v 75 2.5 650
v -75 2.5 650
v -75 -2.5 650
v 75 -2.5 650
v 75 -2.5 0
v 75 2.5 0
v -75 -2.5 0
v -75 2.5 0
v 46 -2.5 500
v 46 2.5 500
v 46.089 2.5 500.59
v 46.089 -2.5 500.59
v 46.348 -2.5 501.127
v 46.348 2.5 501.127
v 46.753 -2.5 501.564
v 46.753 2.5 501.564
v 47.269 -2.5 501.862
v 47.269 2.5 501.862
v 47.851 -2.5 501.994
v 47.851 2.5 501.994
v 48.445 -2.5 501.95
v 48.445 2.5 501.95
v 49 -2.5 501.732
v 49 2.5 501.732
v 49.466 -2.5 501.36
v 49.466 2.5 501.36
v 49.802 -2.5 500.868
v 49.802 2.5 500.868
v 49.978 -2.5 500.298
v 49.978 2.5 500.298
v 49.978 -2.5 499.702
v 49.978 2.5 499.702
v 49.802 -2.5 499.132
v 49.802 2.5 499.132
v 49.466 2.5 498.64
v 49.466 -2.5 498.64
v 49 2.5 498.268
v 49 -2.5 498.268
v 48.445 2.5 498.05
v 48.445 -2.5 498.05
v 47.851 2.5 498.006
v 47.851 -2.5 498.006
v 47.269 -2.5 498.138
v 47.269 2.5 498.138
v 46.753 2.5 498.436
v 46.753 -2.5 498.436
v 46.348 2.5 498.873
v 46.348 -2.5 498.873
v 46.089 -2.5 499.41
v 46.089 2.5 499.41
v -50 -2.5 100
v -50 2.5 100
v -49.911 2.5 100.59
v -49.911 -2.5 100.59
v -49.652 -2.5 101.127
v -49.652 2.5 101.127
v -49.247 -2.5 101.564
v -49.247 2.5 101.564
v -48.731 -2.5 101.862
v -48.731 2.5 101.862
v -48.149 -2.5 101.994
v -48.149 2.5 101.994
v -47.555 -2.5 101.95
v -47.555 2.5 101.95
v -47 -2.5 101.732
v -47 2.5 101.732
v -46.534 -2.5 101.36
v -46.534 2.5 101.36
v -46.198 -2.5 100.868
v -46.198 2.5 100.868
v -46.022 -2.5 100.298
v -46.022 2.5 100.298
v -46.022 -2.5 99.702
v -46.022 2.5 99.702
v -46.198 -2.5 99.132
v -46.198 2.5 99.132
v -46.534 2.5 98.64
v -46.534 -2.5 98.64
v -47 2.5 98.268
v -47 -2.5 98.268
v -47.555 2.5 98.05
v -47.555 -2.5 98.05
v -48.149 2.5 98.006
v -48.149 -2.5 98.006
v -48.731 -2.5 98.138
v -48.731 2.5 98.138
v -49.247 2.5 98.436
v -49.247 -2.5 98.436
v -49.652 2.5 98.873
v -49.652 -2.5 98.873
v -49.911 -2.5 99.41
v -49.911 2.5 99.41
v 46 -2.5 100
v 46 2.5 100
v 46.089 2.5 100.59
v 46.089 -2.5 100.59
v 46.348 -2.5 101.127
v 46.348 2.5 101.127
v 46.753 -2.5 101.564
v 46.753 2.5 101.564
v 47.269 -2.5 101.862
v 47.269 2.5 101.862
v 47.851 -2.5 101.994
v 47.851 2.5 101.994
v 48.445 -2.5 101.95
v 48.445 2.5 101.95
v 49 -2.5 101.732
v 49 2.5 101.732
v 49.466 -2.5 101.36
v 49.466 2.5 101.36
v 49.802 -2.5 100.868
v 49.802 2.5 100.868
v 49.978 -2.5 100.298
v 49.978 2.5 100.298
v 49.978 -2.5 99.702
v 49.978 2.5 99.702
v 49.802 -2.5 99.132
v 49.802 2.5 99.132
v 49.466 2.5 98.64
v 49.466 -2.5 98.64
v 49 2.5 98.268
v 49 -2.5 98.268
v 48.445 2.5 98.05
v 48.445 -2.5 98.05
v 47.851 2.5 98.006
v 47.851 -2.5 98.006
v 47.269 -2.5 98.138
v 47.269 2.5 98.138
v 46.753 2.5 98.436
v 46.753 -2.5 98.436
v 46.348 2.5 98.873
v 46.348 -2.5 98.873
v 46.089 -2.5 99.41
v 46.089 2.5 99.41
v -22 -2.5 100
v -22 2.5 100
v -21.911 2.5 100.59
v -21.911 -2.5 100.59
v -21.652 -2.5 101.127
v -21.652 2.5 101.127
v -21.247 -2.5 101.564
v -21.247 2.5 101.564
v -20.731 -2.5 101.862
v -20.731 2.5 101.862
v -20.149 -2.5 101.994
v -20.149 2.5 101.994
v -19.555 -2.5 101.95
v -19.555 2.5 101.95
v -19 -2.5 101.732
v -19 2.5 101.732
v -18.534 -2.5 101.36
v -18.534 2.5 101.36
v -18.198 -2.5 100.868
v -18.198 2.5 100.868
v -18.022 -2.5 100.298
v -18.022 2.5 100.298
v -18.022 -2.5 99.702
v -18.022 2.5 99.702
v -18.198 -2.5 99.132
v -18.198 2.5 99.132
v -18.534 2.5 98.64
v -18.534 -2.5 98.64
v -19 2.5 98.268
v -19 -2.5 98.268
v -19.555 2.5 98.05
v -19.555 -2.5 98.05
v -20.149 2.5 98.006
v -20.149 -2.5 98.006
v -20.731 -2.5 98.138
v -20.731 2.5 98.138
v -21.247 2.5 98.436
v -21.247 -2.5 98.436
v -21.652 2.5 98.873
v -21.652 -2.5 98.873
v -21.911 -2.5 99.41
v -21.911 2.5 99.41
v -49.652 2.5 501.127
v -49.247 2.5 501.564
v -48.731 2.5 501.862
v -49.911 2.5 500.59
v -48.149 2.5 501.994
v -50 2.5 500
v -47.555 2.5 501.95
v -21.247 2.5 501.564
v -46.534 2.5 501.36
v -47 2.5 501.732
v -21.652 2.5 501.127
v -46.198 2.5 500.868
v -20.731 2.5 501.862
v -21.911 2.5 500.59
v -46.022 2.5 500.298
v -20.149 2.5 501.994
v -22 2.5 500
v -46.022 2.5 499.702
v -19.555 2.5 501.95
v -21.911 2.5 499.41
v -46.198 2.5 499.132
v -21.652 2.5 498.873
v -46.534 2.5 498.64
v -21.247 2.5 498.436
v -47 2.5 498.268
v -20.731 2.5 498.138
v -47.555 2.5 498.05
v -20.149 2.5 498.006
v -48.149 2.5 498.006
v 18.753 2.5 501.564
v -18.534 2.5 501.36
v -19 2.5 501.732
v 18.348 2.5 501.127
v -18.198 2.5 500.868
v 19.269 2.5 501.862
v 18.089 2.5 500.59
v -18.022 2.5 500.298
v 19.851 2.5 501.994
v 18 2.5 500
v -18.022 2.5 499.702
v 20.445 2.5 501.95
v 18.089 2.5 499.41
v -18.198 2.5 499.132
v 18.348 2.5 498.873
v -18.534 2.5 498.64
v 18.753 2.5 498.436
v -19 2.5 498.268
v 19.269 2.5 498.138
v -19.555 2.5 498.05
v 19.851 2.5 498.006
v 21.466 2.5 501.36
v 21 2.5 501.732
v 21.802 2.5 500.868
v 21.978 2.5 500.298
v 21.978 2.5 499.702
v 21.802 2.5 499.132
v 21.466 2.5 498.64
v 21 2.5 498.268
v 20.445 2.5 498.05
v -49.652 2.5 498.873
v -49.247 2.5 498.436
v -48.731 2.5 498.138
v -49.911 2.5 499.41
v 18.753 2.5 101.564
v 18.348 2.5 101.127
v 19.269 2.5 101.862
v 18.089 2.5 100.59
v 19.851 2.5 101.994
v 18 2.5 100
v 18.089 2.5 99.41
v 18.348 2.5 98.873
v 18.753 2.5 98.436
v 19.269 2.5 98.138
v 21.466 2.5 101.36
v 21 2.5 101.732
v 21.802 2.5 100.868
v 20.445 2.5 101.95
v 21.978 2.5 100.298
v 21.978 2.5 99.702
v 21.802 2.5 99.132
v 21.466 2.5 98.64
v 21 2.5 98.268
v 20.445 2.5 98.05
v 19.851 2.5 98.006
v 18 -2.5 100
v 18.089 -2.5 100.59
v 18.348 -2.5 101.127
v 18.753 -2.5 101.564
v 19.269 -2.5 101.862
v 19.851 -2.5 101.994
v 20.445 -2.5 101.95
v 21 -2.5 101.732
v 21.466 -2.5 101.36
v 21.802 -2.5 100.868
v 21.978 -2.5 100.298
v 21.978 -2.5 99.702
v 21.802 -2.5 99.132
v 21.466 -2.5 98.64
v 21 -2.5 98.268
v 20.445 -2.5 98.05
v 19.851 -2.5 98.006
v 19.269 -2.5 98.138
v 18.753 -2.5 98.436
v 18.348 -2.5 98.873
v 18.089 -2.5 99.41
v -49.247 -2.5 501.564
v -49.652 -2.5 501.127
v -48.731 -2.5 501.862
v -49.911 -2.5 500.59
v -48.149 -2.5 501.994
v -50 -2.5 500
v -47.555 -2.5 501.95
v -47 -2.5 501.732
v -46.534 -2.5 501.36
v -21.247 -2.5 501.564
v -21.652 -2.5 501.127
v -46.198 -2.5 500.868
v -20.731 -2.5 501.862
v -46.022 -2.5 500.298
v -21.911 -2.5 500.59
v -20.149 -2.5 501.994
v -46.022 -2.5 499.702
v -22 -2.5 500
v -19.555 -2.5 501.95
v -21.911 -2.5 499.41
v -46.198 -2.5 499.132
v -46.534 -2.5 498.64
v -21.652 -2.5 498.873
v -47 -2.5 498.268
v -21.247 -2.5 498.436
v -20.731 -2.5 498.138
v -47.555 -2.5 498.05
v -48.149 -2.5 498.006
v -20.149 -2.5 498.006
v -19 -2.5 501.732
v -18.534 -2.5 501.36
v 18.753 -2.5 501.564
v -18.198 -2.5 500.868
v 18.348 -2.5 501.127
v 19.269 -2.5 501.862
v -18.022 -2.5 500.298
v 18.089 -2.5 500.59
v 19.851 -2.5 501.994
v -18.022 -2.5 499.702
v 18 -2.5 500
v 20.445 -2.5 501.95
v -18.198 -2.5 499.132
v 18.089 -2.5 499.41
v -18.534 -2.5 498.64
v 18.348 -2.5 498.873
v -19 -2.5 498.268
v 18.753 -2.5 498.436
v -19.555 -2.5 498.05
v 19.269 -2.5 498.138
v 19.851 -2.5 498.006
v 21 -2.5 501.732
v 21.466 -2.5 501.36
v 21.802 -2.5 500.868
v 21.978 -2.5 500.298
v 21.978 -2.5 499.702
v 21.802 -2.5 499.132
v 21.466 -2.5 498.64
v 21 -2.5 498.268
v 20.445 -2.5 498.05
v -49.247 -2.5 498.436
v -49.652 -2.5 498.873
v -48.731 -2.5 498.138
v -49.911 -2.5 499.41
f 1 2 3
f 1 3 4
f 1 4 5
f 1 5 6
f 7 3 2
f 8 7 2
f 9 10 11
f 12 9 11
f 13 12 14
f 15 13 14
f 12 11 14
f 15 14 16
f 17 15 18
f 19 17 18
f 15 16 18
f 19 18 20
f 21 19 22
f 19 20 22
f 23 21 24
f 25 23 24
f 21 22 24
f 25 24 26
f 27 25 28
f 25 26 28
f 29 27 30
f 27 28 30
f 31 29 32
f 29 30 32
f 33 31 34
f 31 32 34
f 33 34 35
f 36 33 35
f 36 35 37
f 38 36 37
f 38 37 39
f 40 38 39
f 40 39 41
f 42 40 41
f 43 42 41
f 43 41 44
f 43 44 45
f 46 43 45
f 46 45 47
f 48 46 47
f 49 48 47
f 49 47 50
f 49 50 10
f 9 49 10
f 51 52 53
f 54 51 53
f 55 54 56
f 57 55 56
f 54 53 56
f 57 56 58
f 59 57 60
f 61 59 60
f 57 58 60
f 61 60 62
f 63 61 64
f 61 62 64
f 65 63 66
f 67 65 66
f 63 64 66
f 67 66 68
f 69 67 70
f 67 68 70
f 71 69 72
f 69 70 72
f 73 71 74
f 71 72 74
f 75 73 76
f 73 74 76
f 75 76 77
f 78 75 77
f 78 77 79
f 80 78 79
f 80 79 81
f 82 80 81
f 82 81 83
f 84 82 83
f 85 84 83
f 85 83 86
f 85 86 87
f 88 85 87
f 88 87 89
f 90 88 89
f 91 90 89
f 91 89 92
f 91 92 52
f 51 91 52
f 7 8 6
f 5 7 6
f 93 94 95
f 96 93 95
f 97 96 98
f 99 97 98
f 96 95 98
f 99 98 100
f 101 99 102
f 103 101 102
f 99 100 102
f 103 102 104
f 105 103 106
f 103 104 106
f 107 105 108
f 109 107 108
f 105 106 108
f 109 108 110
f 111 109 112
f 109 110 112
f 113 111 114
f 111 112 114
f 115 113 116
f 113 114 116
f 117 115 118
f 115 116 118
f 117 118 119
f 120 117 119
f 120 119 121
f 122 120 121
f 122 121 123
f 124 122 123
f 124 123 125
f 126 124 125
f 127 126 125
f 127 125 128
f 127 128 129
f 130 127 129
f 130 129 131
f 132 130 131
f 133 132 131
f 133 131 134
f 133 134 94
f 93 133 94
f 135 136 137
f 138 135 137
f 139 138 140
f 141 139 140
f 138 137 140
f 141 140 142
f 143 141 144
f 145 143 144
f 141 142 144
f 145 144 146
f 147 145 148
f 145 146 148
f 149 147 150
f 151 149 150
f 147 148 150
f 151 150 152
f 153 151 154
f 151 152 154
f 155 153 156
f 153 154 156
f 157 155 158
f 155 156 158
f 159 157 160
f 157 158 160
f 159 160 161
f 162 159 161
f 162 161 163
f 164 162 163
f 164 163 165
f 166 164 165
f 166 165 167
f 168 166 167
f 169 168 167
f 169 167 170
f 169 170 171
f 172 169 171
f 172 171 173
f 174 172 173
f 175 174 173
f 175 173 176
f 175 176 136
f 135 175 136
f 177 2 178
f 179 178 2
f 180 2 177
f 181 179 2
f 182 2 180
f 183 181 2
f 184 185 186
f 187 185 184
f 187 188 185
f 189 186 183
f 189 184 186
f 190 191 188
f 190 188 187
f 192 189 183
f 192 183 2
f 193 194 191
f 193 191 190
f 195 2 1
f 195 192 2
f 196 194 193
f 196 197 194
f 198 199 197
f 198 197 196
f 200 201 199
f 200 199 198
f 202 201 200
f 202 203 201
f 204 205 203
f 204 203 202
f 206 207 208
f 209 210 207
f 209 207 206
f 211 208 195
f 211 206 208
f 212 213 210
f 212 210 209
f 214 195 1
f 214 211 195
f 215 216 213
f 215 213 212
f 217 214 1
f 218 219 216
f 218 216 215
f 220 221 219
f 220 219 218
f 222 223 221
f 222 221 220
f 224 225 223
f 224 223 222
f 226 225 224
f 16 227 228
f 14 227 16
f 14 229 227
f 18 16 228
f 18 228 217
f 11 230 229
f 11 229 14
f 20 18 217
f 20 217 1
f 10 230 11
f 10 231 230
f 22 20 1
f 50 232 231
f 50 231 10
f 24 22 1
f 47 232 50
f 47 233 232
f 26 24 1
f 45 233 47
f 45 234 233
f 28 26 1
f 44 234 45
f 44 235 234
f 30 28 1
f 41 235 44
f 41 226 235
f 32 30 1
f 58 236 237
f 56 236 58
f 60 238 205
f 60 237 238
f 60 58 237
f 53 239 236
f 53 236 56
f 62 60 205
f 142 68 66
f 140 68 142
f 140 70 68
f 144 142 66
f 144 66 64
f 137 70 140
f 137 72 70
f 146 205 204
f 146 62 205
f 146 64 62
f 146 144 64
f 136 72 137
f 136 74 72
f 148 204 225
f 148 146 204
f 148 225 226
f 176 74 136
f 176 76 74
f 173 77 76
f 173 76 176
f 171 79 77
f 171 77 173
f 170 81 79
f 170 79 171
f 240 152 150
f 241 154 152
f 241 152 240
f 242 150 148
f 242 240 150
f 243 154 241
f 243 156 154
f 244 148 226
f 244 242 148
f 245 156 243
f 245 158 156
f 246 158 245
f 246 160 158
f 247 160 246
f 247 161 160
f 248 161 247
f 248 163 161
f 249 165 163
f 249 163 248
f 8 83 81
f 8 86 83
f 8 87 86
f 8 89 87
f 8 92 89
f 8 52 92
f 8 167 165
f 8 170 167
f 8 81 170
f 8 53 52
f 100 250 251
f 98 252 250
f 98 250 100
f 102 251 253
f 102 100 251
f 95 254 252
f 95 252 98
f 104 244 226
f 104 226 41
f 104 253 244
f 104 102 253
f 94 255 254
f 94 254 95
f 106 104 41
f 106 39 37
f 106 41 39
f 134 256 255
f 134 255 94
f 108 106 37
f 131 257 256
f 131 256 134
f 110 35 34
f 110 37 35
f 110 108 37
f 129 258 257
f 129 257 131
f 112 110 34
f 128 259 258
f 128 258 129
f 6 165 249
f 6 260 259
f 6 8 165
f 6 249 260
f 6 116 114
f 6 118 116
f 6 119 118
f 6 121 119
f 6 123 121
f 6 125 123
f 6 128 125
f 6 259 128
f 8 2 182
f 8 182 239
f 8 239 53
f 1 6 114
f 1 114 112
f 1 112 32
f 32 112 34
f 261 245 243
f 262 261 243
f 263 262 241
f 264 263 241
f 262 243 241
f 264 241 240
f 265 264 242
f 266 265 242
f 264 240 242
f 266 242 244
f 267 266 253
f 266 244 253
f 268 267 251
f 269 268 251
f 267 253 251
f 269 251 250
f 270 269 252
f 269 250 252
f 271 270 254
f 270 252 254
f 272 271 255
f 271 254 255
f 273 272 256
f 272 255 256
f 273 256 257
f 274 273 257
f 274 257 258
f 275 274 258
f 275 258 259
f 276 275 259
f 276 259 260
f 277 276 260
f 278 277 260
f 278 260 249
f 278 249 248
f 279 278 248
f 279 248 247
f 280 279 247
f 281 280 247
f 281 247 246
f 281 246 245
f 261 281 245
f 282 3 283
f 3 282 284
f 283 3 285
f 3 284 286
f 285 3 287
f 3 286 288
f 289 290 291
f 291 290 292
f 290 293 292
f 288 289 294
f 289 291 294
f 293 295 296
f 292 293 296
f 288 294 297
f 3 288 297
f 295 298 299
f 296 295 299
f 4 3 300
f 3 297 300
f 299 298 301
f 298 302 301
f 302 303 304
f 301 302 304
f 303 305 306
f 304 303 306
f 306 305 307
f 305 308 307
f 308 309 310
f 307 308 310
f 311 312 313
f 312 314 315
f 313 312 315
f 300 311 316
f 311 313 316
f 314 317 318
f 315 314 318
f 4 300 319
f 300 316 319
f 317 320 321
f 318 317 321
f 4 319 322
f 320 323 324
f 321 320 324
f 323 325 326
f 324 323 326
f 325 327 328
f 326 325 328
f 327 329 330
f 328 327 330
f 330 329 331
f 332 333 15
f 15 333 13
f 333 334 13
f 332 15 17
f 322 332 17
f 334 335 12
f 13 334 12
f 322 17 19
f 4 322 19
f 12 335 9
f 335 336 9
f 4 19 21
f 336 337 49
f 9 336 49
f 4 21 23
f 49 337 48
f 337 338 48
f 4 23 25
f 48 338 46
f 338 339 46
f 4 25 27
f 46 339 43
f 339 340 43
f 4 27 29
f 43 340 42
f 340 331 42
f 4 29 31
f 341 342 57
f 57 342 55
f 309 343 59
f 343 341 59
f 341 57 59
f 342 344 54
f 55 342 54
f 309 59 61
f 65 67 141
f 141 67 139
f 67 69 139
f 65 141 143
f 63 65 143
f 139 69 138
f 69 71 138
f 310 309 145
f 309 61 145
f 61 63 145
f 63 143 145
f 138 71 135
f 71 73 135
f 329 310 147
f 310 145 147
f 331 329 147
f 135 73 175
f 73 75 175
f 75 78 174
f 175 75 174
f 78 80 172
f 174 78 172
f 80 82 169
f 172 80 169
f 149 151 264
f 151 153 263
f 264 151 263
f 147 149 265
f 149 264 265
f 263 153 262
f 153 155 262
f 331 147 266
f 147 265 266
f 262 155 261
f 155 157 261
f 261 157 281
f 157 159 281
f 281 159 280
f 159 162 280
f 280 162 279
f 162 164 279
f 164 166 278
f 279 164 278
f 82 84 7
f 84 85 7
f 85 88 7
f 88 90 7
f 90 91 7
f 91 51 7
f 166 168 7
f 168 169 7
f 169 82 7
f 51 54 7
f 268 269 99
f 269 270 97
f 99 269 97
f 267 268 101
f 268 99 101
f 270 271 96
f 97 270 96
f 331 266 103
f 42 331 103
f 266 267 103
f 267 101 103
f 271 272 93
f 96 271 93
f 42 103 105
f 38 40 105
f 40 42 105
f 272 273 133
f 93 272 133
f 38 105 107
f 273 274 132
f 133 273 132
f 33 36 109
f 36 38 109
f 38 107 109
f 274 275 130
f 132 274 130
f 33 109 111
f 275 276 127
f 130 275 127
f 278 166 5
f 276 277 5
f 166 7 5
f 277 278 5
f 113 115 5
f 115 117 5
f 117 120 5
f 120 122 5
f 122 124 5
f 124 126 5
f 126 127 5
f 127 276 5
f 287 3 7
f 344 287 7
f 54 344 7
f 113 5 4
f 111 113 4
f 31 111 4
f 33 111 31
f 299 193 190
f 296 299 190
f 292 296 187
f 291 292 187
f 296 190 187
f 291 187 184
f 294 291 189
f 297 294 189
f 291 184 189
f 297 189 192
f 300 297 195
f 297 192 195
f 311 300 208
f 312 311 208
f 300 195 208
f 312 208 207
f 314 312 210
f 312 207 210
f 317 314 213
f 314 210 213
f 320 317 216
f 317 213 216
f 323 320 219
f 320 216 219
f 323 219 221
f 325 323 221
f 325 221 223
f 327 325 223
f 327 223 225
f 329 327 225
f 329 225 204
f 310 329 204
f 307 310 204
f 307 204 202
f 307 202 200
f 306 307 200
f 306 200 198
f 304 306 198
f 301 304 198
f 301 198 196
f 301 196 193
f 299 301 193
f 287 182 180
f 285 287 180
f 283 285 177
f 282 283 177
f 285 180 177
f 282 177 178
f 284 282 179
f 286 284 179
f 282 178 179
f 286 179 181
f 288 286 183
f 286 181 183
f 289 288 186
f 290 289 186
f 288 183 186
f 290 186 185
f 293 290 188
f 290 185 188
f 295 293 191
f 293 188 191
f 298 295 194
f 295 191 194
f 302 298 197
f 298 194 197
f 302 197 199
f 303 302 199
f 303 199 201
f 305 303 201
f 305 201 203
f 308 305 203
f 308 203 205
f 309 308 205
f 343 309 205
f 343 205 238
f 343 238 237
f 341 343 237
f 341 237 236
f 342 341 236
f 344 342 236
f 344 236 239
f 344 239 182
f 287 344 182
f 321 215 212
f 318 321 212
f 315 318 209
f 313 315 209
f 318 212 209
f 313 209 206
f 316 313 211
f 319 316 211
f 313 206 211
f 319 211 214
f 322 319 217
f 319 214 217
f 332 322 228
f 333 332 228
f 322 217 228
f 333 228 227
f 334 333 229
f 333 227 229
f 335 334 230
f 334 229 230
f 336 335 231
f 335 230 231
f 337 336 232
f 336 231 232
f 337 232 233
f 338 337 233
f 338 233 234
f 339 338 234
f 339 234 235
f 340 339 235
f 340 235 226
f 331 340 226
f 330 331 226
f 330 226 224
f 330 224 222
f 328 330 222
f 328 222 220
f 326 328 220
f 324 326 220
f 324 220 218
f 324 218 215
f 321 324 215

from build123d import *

# Parameters (mm, degrees)
SKETCH1_W           = 150
SKETCH1_H           = 5
BOSS_EXTRUDE1_DEPTH = 650
CUT_EXTRUDE1_REACH  = 656.332
SKETCH2_R           = 2


with BuildPart() as part:
    # Sketch1 → Boss-Extrude1 (new body)
    with BuildSketch(Plane.XY):
        Rectangle(SKETCH1_W, SKETCH1_H)
    extrude(amount=BOSS_EXTRUDE1_DEPTH)

    # Sketch2 → Cut-Extrude1 (cut, up to next)
    with BuildSketch(Plane(origin=(0, 2.5, 0), x_dir=(1, 0, 0), z_dir=(0, 1, 0)), mode=Mode.PRIVATE) as cut_extrude1_sk1:
        with Locations(Location((-20, -500, 0), (0, 0, 180))):
            Circle(SKETCH2_R)
    cut_extrude1_tool1 = extrude(cut_extrude1_sk1.sketch, amount=-CUT_EXTRUDE1_REACH, mode=Mode.PRIVATE) & part.part
    # Sketch2 → Cut-Extrude1 (cut, up to next)
    with BuildSketch(Plane(origin=(0, 2.5, 0), x_dir=(1, 0, 0), z_dir=(0, 1, 0)), mode=Mode.PRIVATE) as cut_extrude1_sk2:
        with Locations(Location((-48, -500, 0), (0, 0, 180))):
            Circle(SKETCH2_R)
    cut_extrude1_tool2 = extrude(cut_extrude1_sk2.sketch, amount=-CUT_EXTRUDE1_REACH, mode=Mode.PRIVATE) & part.part
    # Sketch2 → Cut-Extrude1 (cut, up to next)
    with BuildSketch(Plane(origin=(0, 2.5, 0), x_dir=(1, 0, 0), z_dir=(0, 1, 0)), mode=Mode.PRIVATE) as cut_extrude1_sk3:
        with Locations(Location((48, -500, 0), (0, 0, 180))):
            Circle(SKETCH2_R)
    cut_extrude1_tool3 = extrude(cut_extrude1_sk3.sketch, amount=-CUT_EXTRUDE1_REACH, mode=Mode.PRIVATE) & part.part
    # Sketch2 → Cut-Extrude1 (cut, up to next)
    with BuildSketch(Plane(origin=(0, 2.5, 0), x_dir=(1, 0, 0), z_dir=(0, 1, 0)), mode=Mode.PRIVATE) as cut_extrude1_sk4:
        with Locations(Location((20, -500, 0), (0, 0, 180))):
            Circle(SKETCH2_R)
    cut_extrude1_tool4 = extrude(cut_extrude1_sk4.sketch, amount=-CUT_EXTRUDE1_REACH, mode=Mode.PRIVATE) & part.part
    # Sketch2 → Cut-Extrude1 (cut, up to next)
    with BuildSketch(Plane(origin=(0, 2.5, 0), x_dir=(1, 0, 0), z_dir=(0, 1, 0)), mode=Mode.PRIVATE) as cut_extrude1_sk5:
        with Locations(Location((48, -100, 0), (0, 0, 180))):
            Circle(SKETCH2_R)
    cut_extrude1_tool5 = extrude(cut_extrude1_sk5.sketch, amount=-CUT_EXTRUDE1_REACH, mode=Mode.PRIVATE) & part.part
    # Sketch2 → Cut-Extrude1 (cut, up to next)
    with BuildSketch(Plane(origin=(0, 2.5, 0), x_dir=(1, 0, 0), z_dir=(0, 1, 0)), mode=Mode.PRIVATE) as cut_extrude1_sk6:
        with Locations(Location((20, -100, 0), (0, 0, 180))):
            Circle(SKETCH2_R)
    cut_extrude1_tool6 = extrude(cut_extrude1_sk6.sketch, amount=-CUT_EXTRUDE1_REACH, mode=Mode.PRIVATE) & part.part
    # Sketch2 → Cut-Extrude1 (cut, up to next)
    with BuildSketch(Plane(origin=(0, 2.5, 0), x_dir=(1, 0, 0), z_dir=(0, 1, 0)), mode=Mode.PRIVATE) as cut_extrude1_sk7:
        with Locations(Location((-20, -100, 0), (0, 0, 180))):
            Circle(SKETCH2_R)
    cut_extrude1_tool7 = extrude(cut_extrude1_sk7.sketch, amount=-CUT_EXTRUDE1_REACH, mode=Mode.PRIVATE) & part.part
    # Sketch2 → Cut-Extrude1 (cut, up to next)
    with BuildSketch(Plane(origin=(0, 2.5, 0), x_dir=(1, 0, 0), z_dir=(0, 1, 0)), mode=Mode.PRIVATE) as cut_extrude1_sk8:
        with Locations(Location((-48, -100, 0), (0, 0, 180))):
            Circle(SKETCH2_R)
    cut_extrude1_tool8 = extrude(cut_extrude1_sk8.sketch, amount=-CUT_EXTRUDE1_REACH, mode=Mode.PRIVATE) & part.part
    add(cut_extrude1_tool1.solids().sort_by_distance((-20, 2.5, 500))[0], mode=Mode.SUBTRACT)
    add(cut_extrude1_tool2.solids().sort_by_distance((-48, 2.5, 500))[0], mode=Mode.SUBTRACT)
    add(cut_extrude1_tool3.solids().sort_by_distance((48, 2.5, 500))[0], mode=Mode.SUBTRACT)
    add(cut_extrude1_tool4.solids().sort_by_distance((20, 2.5, 500))[0], mode=Mode.SUBTRACT)
    add(cut_extrude1_tool5.solids().sort_by_distance((48, 2.5, 100))[0], mode=Mode.SUBTRACT)
    add(cut_extrude1_tool6.solids().sort_by_distance((20, 2.5, 100))[0], mode=Mode.SUBTRACT)
    add(cut_extrude1_tool7.solids().sort_by_distance((-20, 2.5, 100))[0], mode=Mode.SUBTRACT)
    add(cut_extrude1_tool8.solids().sort_by_distance((-48, 2.5, 100))[0], mode=Mode.SUBTRACT)


solid = part.part
